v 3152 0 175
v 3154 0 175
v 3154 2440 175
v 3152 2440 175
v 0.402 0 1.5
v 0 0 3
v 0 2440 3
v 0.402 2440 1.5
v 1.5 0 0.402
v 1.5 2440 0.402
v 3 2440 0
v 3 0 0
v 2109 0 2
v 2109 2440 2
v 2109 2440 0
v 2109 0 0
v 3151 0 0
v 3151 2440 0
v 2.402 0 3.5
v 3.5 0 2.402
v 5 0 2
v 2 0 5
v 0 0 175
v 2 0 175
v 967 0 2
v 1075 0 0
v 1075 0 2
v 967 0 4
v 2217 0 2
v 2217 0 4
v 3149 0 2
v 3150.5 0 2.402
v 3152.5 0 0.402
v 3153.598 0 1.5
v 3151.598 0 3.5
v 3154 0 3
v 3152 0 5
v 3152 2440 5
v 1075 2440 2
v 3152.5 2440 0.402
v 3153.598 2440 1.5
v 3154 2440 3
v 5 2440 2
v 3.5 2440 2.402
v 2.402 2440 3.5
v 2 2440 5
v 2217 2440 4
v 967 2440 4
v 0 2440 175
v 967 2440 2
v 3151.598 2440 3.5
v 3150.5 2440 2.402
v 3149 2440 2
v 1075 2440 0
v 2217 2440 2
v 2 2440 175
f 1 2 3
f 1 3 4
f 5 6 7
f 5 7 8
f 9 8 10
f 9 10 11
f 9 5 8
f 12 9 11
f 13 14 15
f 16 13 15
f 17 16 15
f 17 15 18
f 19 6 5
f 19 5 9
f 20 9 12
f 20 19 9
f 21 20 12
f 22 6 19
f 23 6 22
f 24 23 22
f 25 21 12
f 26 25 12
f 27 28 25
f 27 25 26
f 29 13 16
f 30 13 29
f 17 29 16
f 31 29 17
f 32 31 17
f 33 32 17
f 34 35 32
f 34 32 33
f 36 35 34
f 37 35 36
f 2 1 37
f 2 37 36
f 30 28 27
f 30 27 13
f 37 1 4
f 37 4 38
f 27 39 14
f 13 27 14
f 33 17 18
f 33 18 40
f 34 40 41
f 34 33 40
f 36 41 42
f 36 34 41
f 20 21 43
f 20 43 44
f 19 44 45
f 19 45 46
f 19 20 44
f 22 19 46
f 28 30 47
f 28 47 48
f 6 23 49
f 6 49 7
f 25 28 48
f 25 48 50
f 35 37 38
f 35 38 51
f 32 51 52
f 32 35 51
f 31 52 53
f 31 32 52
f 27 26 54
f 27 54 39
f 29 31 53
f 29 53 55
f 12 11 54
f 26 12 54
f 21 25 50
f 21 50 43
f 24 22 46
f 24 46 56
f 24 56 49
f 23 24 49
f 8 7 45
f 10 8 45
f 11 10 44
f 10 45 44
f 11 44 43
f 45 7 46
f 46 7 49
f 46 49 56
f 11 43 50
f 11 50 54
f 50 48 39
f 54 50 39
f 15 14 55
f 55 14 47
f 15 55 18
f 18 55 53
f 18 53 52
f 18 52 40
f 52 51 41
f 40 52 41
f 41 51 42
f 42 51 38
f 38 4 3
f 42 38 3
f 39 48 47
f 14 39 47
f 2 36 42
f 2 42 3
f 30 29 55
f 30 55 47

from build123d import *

# Parameters (mm, degrees)
F1_DEPTH = 2440


with BuildPart() as f1:
    # F0 (on Front) → F1 (new body)
    with BuildSketch(Plane.XZ):
        with BuildLine():
            ThreePointArc((0, 3), (0.87868, 0.87868), (3, 0))
            Line((3, 0), (1075, 0))
            Line((1075, 0), (1075, 2))
            Line((1075, 2), (967, 2))
            Line((967, 2), (5, 2))
            ThreePointArc((5, 2), (2.87868, 2.87868), (2, 5))
            Line((2, 5), (2, 175))
            Line((2, 175), (0, 175))
            Line((0, 175), (0, 3))
        make_face()
        with BuildLine():
            Line((2217, 2), (2109, 2))
            Line((2109, 2), (2109, 0))
            Line((2109, 0), (3151, 0))
            ThreePointArc((3151, 0), (3153.12132, 0.87868), (3154, 3))
            Line((3154, 3), (3154, 175))
            Line((3154, 175), (3152, 175))
            Line((3152, 175), (3152, 5))
            ThreePointArc((3152, 5), (3151.12132, 2.87868), (3149, 2))
            Line((3149, 2), (2217, 2))
        make_face()
        Polygon((967, 2), (1075, 2), (2109, 2), (2217, 2), (2217, 4), (967, 4), align=None)
    extrude(amount=-F1_DEPTH)


solid = f1.part
